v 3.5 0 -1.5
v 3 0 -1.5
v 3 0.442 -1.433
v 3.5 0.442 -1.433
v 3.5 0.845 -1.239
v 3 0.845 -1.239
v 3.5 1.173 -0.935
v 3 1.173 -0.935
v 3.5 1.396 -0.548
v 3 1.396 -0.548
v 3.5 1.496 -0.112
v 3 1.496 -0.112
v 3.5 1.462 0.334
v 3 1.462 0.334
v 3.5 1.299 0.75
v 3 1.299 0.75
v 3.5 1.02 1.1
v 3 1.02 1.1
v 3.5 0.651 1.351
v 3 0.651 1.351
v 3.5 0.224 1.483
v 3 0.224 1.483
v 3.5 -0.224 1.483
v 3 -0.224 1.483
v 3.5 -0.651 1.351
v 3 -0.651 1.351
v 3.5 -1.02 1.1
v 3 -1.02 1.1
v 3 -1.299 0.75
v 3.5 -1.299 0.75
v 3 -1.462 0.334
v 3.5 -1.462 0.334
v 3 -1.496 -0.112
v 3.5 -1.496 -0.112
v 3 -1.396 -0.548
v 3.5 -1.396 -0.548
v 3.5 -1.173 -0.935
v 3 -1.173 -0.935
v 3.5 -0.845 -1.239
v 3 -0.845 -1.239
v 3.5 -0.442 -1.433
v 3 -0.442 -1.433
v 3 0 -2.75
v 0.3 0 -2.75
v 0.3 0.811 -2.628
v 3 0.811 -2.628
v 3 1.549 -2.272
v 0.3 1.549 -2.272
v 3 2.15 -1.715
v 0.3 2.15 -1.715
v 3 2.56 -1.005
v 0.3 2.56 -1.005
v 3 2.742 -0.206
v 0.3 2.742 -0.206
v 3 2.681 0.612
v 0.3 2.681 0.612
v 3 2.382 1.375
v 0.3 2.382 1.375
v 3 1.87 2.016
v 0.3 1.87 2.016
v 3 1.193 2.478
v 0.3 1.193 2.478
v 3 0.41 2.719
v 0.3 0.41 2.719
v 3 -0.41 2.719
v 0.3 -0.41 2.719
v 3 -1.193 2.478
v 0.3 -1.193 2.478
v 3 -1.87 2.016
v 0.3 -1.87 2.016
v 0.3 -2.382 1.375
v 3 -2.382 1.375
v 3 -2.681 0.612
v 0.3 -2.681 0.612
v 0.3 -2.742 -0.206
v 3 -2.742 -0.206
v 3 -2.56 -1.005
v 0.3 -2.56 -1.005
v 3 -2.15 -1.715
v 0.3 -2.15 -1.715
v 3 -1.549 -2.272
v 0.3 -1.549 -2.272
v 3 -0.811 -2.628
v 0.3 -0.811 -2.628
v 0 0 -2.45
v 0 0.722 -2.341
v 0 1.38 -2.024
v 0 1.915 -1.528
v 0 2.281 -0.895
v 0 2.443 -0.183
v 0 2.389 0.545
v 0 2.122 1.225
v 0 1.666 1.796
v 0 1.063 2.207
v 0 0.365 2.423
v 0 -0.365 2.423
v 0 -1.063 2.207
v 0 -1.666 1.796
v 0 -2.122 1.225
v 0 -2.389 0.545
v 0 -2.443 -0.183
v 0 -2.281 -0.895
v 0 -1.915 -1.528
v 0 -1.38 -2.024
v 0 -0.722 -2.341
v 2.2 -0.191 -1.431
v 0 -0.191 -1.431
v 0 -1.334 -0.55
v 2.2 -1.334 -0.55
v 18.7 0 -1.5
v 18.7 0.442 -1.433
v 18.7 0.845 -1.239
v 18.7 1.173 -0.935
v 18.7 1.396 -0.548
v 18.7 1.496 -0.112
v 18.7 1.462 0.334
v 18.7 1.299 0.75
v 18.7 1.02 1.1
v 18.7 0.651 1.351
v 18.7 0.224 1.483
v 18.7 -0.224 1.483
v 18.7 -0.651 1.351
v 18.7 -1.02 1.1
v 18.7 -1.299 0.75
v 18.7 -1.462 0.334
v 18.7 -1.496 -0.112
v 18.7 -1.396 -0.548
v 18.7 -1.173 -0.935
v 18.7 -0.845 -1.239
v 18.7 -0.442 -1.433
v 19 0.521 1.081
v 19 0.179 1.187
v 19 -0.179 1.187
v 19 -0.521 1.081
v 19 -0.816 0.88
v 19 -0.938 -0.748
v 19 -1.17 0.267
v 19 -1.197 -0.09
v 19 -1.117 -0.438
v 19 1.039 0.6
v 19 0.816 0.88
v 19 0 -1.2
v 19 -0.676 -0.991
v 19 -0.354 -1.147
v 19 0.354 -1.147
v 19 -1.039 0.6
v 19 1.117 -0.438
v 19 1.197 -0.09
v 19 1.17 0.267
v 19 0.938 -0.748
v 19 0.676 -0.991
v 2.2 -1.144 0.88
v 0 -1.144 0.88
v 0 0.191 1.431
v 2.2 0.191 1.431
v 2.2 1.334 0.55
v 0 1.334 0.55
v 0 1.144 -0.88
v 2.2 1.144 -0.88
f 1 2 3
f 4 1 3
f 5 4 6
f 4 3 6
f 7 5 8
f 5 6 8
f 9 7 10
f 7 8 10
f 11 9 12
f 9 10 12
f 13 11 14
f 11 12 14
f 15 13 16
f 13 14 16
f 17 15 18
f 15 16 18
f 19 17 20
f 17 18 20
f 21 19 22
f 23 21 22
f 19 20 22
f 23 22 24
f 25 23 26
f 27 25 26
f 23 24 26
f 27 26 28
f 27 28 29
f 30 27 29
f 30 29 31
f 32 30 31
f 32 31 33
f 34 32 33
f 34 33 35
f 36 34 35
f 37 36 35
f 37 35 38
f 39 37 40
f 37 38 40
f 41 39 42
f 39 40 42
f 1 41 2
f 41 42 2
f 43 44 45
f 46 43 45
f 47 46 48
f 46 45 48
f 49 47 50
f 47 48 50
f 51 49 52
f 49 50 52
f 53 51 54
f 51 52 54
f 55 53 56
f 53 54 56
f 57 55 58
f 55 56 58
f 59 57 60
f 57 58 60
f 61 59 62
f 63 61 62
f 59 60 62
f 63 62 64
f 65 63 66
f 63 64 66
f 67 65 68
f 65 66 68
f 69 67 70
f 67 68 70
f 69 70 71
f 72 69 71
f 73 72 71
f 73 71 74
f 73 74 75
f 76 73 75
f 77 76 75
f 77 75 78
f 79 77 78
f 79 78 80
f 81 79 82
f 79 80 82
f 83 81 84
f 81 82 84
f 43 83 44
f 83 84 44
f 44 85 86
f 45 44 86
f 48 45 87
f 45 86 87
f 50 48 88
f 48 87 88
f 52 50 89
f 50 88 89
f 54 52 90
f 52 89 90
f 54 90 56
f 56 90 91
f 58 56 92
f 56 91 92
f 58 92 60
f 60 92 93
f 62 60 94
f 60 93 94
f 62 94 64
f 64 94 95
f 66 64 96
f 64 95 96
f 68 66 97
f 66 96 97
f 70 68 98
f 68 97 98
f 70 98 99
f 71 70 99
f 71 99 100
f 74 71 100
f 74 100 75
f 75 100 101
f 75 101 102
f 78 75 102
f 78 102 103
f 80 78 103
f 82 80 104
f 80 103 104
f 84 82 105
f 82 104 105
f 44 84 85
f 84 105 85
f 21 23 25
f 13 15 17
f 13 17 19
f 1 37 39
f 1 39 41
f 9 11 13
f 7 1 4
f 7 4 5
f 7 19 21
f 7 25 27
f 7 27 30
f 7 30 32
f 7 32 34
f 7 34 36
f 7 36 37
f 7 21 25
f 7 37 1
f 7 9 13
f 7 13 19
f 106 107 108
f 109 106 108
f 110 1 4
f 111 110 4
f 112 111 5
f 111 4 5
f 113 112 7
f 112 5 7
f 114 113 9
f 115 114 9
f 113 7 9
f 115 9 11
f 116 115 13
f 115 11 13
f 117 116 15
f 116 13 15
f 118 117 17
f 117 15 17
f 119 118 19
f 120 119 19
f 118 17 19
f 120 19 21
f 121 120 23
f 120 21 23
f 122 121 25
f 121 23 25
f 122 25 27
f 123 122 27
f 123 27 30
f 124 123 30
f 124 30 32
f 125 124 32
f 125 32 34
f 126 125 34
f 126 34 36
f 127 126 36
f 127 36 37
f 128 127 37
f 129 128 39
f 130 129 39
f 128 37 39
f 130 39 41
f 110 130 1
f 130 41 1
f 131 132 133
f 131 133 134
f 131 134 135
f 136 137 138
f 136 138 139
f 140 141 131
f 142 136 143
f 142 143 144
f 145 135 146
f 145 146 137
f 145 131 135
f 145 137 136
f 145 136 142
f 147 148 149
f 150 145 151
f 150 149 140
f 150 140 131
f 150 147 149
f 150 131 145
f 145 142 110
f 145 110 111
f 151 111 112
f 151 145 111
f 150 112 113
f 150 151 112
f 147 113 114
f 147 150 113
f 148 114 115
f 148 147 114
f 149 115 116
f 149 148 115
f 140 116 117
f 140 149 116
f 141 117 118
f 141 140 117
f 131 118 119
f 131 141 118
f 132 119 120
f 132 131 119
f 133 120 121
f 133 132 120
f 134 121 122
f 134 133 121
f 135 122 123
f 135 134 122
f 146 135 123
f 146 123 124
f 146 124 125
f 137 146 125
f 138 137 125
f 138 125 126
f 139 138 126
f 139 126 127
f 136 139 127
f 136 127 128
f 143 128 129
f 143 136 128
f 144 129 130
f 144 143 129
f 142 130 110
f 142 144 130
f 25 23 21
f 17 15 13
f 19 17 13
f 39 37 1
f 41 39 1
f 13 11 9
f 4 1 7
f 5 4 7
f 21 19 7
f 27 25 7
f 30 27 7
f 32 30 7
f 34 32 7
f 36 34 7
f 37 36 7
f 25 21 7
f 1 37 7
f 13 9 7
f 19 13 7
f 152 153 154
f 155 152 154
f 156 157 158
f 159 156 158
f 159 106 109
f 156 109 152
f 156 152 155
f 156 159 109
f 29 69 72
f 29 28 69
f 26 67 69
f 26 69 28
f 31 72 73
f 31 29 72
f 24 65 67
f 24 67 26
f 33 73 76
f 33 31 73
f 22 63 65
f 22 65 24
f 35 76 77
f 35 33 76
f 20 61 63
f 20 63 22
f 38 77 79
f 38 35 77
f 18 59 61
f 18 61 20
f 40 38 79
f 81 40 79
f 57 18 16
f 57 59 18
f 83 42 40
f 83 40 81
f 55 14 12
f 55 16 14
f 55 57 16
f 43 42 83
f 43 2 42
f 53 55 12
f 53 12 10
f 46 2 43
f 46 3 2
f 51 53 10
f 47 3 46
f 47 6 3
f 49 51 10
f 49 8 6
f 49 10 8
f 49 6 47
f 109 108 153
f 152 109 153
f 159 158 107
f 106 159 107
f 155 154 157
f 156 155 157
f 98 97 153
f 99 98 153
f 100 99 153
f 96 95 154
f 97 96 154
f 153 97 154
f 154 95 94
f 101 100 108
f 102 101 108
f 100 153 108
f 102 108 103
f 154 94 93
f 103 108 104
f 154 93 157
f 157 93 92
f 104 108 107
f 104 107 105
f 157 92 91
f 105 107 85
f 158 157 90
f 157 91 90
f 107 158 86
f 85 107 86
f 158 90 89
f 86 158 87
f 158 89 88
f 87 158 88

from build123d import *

# Parameters (mm, degrees)
SKETCH_1_R          = 2.75
EXTRUDE_1_DEPTH     = 3
SKETCH_2_R          = 1.5
EXTRUDE_2_DEPTH     = 0.5
CHAMFER_2_SIZE      = 0.3
CUT_EXTRUDE_1_DEPTH = 2.2
SKETCH_11_R         = 1.5
EXTRUDE_6_DEPTH     = 15.5
CHAMFER_3_SIZE      = 0.3


with BuildPart() as part:
    # 草图1 → 凸台-拉伸1 (new body)
    with BuildSketch(Plane(origin=(0, 0, 0), x_dir=(0, 0, -1), z_dir=(1, 0, 0))):
        Circle(SKETCH_1_R)
    extrude(amount=EXTRUDE_1_DEPTH)

    # 草图2 → 凸台-拉伸2 (add)
    with BuildSketch(Plane(origin=(3, 0, 0), x_dir=(0, 0, -1), z_dir=(1, 0, 0))):
        Circle(SKETCH_2_R)
    extrude(amount=EXTRUDE_2_DEPTH)

    # 倒角2
    chamfer_2_edges = [part.edges().sort_by_distance(p)[0] for p in [
        (0, 0, 2.75),
    ]]
    chamfer(chamfer_2_edges, length=CHAMFER_2_SIZE)

    # 草图5 → 切除-拉伸1 (cut)
    with BuildSketch(Plane.ZY):
        Polygon((1.430744137, 0.190537526), (0.550361731, 1.334329531), (-0.880382406, 1.143792006), (-1.430744137, -0.190537526), (-0.550361731, -1.334329531), (0.880382406, -1.143792006), align=None)
    extrude(amount=-CUT_EXTRUDE_1_DEPTH, mode=Mode.SUBTRACT)


with BuildPart() as body_2:
    # 草图11 → 凸台-拉伸6 (new body)
    with BuildSketch(Plane(origin=(3.5, 0, 0), x_dir=(0, 0, -1), z_dir=(1, 0, 0))):
        Circle(SKETCH_11_R)
    extrude(amount=EXTRUDE_6_DEPTH)

    # 倒角3
    chamfer_3_edges = [body_2.edges().sort_by_distance(p)[0] for p in [
        (19, 0, 1.5),
    ]]
    chamfer(chamfer_3_edges, length=CHAMFER_3_SIZE)


solid = Compound([part.part, body_2.part])
